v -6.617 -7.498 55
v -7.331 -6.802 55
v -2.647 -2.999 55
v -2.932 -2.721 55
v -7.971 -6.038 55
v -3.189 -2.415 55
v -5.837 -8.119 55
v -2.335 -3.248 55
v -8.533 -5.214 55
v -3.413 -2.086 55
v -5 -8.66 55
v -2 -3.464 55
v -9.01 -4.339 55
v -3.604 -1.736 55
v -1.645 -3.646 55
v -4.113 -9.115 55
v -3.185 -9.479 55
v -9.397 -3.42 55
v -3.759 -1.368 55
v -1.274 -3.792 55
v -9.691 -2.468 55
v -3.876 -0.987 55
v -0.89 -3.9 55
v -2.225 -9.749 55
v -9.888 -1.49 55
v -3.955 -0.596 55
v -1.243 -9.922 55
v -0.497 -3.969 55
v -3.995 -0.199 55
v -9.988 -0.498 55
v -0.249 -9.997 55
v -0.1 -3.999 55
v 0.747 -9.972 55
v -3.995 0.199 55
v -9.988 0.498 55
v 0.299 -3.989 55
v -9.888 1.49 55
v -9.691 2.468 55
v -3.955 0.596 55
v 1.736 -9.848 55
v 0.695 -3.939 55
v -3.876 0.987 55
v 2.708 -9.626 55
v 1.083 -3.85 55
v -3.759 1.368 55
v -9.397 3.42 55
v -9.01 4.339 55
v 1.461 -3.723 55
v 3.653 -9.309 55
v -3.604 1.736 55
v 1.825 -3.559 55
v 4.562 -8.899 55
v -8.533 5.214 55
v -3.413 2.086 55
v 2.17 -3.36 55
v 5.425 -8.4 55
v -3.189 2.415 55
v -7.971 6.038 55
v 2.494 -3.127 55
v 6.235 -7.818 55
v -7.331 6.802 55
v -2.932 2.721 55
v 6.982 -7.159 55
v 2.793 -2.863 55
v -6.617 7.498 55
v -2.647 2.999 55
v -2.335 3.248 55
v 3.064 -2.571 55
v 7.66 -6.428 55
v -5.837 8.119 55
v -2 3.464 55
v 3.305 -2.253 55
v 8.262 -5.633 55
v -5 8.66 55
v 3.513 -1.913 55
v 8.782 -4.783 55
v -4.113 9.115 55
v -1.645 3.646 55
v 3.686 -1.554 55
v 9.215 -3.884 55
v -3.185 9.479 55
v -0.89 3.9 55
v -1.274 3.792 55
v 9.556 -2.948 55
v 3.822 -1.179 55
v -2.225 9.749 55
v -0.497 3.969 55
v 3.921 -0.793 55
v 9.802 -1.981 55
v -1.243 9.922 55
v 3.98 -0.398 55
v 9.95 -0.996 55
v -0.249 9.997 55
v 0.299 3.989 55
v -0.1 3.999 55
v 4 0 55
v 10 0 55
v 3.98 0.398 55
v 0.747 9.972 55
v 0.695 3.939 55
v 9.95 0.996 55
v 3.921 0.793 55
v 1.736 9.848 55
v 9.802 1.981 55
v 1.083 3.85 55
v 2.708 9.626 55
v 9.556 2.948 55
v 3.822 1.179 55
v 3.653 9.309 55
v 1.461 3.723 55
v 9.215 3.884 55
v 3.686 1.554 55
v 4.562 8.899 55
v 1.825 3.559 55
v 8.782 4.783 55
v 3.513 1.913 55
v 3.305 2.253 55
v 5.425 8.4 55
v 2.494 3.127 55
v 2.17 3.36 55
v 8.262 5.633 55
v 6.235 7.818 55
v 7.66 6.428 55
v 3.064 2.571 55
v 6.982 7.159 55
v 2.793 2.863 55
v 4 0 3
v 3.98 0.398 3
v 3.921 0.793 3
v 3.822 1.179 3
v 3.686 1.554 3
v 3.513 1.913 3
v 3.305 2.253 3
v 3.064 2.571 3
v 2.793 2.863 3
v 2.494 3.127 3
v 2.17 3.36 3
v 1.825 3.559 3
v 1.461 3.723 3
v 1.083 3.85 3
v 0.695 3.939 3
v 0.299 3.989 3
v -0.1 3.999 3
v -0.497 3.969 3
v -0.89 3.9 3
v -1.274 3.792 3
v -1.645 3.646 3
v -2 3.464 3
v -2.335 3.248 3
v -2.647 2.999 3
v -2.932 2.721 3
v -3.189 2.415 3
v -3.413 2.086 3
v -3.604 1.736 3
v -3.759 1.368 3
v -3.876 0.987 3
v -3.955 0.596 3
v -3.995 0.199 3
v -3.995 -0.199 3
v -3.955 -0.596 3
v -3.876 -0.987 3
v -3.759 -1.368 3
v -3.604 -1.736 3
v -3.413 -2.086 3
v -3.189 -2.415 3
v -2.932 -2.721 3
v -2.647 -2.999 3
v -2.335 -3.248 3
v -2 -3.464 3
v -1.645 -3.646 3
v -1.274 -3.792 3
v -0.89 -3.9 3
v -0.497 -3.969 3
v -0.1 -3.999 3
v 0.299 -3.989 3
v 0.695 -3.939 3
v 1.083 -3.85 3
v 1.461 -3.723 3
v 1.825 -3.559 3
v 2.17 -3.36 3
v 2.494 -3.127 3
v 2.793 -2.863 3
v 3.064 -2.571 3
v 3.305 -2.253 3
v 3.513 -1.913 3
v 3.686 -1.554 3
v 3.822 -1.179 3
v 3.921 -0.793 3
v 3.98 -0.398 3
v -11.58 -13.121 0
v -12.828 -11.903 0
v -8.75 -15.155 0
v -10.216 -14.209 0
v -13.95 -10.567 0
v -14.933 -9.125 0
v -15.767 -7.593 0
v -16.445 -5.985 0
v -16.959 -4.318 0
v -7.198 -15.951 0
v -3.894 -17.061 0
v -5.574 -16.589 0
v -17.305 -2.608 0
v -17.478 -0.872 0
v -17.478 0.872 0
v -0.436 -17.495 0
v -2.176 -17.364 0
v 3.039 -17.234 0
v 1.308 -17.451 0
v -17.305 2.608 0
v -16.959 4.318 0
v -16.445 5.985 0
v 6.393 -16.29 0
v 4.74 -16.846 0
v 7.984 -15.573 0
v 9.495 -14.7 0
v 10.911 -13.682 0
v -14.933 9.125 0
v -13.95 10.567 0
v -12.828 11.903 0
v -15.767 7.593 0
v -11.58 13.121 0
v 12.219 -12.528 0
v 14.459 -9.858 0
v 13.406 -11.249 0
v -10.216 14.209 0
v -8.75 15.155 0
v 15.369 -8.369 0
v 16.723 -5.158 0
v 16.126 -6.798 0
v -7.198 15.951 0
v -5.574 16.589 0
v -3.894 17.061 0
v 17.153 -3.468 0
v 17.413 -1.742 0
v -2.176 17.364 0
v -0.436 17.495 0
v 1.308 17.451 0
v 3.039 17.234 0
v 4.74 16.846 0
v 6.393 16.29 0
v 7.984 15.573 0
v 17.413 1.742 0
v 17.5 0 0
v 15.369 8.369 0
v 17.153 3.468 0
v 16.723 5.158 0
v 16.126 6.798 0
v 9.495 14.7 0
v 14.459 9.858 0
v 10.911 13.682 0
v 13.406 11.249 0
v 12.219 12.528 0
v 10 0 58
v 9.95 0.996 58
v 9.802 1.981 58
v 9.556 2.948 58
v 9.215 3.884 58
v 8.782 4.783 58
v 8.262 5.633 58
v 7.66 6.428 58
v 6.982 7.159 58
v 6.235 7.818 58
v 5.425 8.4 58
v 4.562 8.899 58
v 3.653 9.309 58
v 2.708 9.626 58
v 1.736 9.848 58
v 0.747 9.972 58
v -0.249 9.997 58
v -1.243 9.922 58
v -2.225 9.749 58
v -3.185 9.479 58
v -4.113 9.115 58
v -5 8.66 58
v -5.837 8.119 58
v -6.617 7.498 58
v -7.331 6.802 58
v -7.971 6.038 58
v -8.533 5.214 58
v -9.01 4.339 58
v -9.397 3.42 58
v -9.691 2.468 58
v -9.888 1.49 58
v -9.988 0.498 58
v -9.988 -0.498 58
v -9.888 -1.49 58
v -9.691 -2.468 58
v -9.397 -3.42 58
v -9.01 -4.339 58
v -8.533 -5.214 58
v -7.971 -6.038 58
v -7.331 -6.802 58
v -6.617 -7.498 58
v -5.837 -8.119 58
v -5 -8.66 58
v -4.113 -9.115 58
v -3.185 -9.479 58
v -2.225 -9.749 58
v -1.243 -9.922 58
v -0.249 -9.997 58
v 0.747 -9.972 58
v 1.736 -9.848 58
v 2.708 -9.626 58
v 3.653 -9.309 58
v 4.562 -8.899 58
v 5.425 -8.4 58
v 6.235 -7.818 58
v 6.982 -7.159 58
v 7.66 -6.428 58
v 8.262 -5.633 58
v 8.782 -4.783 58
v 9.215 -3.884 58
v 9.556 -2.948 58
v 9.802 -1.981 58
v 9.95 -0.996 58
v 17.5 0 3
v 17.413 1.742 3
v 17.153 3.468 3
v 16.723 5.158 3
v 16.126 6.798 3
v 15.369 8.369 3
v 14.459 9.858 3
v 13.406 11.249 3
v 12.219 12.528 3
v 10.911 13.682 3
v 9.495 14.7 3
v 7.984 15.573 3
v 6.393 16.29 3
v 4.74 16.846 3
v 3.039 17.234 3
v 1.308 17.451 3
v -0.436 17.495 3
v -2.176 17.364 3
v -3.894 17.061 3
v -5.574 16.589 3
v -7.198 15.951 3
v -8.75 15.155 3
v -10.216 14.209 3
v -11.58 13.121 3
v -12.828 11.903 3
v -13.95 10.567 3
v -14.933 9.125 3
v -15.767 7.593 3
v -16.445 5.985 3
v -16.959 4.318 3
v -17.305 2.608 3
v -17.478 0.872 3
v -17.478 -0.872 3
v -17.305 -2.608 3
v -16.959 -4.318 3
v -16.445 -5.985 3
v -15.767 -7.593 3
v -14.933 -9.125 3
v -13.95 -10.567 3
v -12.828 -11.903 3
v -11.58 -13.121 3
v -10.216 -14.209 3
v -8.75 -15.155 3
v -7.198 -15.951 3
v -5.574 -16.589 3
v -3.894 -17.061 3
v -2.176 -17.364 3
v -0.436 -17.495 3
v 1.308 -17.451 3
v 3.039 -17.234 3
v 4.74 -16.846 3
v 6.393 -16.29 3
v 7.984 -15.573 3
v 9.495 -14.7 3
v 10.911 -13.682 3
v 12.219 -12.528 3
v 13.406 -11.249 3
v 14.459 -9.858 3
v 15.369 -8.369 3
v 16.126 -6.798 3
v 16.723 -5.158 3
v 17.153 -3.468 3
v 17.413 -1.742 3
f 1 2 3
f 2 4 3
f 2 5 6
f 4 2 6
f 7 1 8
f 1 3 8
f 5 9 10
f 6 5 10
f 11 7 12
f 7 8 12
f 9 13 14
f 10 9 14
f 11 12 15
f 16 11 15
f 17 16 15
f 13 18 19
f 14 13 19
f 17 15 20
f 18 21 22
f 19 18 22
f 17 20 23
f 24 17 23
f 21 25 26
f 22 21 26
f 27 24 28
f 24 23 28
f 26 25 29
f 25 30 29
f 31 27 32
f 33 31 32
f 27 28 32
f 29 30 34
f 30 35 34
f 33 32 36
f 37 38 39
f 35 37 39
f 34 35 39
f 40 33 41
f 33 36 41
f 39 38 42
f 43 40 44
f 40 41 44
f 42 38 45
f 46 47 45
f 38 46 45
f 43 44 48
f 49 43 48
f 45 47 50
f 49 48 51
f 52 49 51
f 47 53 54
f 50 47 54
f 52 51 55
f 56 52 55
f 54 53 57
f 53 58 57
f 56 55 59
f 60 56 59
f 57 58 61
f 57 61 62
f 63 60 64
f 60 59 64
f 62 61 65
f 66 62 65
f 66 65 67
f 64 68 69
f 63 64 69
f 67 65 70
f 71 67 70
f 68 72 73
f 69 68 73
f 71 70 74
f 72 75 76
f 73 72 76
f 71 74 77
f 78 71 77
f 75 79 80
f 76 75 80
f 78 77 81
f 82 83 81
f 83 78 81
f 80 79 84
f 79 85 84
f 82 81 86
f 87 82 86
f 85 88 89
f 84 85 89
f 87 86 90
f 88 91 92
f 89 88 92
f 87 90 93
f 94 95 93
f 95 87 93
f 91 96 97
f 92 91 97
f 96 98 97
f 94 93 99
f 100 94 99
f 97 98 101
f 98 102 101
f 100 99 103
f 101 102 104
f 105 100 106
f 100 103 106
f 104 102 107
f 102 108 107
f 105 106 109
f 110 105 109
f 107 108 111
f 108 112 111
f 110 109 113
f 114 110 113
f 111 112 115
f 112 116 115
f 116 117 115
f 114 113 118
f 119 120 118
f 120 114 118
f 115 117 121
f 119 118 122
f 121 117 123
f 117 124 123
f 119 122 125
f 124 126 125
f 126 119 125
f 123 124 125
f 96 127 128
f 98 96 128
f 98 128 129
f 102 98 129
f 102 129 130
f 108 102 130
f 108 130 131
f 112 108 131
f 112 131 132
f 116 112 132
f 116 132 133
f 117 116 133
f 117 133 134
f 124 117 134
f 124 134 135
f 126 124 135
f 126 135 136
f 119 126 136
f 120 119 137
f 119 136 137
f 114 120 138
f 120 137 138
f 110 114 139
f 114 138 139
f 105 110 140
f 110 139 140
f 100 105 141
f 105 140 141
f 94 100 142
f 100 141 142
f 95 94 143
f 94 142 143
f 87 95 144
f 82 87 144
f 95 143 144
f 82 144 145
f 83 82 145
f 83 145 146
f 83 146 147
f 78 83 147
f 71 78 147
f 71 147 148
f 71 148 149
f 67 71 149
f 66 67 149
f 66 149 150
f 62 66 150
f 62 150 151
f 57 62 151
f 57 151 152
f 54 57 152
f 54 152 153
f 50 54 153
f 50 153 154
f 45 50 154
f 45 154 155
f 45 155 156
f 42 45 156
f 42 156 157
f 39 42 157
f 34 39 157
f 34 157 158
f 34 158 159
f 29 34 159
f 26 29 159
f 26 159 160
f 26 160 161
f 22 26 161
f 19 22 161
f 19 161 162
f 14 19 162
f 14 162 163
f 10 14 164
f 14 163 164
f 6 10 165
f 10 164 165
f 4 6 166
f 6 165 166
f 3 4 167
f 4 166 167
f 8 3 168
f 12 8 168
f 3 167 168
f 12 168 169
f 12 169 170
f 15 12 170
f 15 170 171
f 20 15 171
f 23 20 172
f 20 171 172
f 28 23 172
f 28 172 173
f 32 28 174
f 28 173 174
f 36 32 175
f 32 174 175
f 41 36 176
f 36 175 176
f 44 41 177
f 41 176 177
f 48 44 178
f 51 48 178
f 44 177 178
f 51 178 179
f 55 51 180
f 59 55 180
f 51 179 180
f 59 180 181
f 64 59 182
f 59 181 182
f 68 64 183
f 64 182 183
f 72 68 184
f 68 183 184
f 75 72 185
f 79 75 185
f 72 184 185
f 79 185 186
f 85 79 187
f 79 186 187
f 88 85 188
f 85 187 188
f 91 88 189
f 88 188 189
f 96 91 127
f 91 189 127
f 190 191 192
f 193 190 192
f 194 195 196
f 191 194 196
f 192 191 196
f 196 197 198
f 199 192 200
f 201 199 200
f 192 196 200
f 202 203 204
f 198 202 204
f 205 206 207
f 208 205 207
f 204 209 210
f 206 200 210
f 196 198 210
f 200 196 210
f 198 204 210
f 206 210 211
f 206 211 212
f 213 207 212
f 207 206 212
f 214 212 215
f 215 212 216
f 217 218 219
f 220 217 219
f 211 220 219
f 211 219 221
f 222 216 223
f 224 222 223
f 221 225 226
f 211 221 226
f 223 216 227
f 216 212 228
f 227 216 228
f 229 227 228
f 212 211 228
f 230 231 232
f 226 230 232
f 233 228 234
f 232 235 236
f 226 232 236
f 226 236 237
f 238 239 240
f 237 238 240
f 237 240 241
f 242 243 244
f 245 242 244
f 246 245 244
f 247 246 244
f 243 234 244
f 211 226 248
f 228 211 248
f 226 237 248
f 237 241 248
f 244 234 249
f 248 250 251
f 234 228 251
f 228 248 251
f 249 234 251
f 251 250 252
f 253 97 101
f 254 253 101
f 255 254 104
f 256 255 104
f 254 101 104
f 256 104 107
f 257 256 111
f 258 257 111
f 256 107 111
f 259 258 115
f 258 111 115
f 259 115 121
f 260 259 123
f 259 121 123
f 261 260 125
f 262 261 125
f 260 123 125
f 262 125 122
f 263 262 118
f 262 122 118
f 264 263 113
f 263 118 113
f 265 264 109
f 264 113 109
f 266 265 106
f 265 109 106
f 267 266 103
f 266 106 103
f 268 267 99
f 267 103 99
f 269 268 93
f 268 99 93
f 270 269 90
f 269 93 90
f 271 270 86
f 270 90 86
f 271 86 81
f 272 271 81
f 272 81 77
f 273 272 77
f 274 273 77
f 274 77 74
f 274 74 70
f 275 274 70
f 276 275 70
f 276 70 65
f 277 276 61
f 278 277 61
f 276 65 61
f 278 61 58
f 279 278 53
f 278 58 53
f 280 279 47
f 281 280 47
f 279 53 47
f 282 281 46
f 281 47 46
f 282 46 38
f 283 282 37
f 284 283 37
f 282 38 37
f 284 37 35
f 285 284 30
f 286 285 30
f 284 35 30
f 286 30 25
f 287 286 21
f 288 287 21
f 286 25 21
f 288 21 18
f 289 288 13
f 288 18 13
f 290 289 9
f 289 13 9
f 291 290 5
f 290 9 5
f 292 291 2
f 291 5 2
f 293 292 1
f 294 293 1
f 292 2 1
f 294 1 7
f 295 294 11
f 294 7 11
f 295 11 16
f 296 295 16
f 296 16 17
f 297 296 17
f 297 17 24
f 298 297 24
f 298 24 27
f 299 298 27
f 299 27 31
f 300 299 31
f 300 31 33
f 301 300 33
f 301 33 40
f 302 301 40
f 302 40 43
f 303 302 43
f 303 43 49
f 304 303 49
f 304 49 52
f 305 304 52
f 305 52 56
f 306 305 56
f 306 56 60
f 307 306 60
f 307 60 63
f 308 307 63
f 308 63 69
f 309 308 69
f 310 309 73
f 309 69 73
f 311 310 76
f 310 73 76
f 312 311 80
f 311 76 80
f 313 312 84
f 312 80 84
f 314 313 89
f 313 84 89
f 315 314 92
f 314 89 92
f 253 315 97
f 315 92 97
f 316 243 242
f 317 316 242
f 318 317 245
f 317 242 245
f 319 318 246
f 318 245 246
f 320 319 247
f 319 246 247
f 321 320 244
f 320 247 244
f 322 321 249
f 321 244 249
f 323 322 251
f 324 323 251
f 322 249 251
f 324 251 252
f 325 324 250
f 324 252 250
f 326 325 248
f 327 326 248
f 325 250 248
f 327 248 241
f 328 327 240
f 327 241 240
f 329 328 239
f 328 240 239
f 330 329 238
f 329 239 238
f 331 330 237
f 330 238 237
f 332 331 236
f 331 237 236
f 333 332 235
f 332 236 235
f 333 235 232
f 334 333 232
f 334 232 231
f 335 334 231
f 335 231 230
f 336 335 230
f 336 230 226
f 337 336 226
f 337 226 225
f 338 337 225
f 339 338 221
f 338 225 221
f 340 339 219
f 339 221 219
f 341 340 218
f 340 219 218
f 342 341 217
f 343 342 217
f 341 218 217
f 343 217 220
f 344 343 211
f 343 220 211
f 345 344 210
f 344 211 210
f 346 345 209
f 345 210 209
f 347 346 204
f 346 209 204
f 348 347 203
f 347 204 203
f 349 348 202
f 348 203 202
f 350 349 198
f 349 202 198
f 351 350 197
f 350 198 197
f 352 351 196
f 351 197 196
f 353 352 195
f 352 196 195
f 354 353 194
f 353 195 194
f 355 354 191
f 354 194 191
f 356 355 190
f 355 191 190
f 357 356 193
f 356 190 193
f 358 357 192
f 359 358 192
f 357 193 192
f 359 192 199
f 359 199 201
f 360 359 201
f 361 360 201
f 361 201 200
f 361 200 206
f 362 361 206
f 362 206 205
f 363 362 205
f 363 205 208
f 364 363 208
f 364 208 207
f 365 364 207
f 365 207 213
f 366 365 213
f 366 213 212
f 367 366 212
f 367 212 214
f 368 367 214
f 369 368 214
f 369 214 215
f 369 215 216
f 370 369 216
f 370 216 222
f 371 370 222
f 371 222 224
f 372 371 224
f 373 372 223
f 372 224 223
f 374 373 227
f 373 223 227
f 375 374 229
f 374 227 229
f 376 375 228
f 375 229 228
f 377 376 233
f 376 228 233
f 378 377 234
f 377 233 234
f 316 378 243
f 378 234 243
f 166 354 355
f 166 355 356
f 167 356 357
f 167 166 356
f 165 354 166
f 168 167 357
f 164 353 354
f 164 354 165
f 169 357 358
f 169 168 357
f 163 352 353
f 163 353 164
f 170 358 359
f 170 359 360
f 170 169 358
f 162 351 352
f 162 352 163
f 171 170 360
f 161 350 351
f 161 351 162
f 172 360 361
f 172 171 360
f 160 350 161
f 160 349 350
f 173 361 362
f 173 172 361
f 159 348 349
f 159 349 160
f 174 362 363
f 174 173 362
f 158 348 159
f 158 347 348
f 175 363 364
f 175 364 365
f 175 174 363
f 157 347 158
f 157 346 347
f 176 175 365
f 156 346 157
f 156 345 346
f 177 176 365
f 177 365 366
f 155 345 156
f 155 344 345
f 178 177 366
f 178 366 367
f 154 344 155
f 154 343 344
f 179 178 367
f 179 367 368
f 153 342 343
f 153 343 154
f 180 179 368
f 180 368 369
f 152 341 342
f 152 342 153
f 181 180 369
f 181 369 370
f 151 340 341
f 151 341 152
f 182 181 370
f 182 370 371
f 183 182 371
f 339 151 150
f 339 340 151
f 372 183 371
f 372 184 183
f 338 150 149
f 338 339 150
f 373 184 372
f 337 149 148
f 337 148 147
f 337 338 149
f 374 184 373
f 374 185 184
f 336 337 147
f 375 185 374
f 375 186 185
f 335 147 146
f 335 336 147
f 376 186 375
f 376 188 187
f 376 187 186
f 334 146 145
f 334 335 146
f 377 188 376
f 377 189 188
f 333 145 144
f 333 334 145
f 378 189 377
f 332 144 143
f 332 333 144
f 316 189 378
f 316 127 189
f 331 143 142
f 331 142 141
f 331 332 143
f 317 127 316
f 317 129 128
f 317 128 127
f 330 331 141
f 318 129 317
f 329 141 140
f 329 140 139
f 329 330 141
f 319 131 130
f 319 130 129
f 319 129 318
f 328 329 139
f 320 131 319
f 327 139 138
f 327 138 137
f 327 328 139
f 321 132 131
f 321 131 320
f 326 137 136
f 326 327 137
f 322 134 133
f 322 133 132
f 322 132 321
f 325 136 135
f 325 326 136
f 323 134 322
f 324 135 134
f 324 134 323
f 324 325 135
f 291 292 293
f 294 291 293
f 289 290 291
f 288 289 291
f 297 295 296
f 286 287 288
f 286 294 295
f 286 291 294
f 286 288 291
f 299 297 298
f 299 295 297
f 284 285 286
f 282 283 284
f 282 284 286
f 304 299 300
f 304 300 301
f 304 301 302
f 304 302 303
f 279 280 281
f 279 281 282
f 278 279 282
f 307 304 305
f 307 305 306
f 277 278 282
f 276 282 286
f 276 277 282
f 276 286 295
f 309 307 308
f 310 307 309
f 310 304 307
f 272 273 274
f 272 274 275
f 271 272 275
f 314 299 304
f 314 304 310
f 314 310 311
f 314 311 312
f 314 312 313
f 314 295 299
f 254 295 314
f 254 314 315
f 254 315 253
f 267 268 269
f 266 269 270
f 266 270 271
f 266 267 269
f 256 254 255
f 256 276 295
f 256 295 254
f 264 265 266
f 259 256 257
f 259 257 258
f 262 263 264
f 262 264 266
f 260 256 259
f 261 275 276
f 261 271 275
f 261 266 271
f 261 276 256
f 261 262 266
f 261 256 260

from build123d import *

# Parameters (mm, degrees)
F0_R     = 17.5
F0_R_2   = 4
F1_DEPTH = 3
F2_DEPTH = 55
F3_R     = 10
F3_R_2   = 4
F4_DEPTH = 3


with BuildPart() as f1:
    # F0 (on Top) → F1 (new body)
    with BuildSketch(Plane.XY):
        Circle(F0_R)
        Circle(F0_R_2, mode=Mode.SUBTRACT)
        Circle(F0_R_2)
    extrude(amount=F1_DEPTH)

    # F0 (on Top) → F2 (join)
    with BuildSketch(Plane.XY):
        Circle(F0_R_2)
    extrude(amount=F2_DEPTH)

    # F3 (on face) → F4 (join)
    with BuildSketch(Plane.XY.offset(55)):
        Circle(F3_R)
        Circle(F3_R_2)
    extrude(amount=F4_DEPTH)


solid = f1.part
